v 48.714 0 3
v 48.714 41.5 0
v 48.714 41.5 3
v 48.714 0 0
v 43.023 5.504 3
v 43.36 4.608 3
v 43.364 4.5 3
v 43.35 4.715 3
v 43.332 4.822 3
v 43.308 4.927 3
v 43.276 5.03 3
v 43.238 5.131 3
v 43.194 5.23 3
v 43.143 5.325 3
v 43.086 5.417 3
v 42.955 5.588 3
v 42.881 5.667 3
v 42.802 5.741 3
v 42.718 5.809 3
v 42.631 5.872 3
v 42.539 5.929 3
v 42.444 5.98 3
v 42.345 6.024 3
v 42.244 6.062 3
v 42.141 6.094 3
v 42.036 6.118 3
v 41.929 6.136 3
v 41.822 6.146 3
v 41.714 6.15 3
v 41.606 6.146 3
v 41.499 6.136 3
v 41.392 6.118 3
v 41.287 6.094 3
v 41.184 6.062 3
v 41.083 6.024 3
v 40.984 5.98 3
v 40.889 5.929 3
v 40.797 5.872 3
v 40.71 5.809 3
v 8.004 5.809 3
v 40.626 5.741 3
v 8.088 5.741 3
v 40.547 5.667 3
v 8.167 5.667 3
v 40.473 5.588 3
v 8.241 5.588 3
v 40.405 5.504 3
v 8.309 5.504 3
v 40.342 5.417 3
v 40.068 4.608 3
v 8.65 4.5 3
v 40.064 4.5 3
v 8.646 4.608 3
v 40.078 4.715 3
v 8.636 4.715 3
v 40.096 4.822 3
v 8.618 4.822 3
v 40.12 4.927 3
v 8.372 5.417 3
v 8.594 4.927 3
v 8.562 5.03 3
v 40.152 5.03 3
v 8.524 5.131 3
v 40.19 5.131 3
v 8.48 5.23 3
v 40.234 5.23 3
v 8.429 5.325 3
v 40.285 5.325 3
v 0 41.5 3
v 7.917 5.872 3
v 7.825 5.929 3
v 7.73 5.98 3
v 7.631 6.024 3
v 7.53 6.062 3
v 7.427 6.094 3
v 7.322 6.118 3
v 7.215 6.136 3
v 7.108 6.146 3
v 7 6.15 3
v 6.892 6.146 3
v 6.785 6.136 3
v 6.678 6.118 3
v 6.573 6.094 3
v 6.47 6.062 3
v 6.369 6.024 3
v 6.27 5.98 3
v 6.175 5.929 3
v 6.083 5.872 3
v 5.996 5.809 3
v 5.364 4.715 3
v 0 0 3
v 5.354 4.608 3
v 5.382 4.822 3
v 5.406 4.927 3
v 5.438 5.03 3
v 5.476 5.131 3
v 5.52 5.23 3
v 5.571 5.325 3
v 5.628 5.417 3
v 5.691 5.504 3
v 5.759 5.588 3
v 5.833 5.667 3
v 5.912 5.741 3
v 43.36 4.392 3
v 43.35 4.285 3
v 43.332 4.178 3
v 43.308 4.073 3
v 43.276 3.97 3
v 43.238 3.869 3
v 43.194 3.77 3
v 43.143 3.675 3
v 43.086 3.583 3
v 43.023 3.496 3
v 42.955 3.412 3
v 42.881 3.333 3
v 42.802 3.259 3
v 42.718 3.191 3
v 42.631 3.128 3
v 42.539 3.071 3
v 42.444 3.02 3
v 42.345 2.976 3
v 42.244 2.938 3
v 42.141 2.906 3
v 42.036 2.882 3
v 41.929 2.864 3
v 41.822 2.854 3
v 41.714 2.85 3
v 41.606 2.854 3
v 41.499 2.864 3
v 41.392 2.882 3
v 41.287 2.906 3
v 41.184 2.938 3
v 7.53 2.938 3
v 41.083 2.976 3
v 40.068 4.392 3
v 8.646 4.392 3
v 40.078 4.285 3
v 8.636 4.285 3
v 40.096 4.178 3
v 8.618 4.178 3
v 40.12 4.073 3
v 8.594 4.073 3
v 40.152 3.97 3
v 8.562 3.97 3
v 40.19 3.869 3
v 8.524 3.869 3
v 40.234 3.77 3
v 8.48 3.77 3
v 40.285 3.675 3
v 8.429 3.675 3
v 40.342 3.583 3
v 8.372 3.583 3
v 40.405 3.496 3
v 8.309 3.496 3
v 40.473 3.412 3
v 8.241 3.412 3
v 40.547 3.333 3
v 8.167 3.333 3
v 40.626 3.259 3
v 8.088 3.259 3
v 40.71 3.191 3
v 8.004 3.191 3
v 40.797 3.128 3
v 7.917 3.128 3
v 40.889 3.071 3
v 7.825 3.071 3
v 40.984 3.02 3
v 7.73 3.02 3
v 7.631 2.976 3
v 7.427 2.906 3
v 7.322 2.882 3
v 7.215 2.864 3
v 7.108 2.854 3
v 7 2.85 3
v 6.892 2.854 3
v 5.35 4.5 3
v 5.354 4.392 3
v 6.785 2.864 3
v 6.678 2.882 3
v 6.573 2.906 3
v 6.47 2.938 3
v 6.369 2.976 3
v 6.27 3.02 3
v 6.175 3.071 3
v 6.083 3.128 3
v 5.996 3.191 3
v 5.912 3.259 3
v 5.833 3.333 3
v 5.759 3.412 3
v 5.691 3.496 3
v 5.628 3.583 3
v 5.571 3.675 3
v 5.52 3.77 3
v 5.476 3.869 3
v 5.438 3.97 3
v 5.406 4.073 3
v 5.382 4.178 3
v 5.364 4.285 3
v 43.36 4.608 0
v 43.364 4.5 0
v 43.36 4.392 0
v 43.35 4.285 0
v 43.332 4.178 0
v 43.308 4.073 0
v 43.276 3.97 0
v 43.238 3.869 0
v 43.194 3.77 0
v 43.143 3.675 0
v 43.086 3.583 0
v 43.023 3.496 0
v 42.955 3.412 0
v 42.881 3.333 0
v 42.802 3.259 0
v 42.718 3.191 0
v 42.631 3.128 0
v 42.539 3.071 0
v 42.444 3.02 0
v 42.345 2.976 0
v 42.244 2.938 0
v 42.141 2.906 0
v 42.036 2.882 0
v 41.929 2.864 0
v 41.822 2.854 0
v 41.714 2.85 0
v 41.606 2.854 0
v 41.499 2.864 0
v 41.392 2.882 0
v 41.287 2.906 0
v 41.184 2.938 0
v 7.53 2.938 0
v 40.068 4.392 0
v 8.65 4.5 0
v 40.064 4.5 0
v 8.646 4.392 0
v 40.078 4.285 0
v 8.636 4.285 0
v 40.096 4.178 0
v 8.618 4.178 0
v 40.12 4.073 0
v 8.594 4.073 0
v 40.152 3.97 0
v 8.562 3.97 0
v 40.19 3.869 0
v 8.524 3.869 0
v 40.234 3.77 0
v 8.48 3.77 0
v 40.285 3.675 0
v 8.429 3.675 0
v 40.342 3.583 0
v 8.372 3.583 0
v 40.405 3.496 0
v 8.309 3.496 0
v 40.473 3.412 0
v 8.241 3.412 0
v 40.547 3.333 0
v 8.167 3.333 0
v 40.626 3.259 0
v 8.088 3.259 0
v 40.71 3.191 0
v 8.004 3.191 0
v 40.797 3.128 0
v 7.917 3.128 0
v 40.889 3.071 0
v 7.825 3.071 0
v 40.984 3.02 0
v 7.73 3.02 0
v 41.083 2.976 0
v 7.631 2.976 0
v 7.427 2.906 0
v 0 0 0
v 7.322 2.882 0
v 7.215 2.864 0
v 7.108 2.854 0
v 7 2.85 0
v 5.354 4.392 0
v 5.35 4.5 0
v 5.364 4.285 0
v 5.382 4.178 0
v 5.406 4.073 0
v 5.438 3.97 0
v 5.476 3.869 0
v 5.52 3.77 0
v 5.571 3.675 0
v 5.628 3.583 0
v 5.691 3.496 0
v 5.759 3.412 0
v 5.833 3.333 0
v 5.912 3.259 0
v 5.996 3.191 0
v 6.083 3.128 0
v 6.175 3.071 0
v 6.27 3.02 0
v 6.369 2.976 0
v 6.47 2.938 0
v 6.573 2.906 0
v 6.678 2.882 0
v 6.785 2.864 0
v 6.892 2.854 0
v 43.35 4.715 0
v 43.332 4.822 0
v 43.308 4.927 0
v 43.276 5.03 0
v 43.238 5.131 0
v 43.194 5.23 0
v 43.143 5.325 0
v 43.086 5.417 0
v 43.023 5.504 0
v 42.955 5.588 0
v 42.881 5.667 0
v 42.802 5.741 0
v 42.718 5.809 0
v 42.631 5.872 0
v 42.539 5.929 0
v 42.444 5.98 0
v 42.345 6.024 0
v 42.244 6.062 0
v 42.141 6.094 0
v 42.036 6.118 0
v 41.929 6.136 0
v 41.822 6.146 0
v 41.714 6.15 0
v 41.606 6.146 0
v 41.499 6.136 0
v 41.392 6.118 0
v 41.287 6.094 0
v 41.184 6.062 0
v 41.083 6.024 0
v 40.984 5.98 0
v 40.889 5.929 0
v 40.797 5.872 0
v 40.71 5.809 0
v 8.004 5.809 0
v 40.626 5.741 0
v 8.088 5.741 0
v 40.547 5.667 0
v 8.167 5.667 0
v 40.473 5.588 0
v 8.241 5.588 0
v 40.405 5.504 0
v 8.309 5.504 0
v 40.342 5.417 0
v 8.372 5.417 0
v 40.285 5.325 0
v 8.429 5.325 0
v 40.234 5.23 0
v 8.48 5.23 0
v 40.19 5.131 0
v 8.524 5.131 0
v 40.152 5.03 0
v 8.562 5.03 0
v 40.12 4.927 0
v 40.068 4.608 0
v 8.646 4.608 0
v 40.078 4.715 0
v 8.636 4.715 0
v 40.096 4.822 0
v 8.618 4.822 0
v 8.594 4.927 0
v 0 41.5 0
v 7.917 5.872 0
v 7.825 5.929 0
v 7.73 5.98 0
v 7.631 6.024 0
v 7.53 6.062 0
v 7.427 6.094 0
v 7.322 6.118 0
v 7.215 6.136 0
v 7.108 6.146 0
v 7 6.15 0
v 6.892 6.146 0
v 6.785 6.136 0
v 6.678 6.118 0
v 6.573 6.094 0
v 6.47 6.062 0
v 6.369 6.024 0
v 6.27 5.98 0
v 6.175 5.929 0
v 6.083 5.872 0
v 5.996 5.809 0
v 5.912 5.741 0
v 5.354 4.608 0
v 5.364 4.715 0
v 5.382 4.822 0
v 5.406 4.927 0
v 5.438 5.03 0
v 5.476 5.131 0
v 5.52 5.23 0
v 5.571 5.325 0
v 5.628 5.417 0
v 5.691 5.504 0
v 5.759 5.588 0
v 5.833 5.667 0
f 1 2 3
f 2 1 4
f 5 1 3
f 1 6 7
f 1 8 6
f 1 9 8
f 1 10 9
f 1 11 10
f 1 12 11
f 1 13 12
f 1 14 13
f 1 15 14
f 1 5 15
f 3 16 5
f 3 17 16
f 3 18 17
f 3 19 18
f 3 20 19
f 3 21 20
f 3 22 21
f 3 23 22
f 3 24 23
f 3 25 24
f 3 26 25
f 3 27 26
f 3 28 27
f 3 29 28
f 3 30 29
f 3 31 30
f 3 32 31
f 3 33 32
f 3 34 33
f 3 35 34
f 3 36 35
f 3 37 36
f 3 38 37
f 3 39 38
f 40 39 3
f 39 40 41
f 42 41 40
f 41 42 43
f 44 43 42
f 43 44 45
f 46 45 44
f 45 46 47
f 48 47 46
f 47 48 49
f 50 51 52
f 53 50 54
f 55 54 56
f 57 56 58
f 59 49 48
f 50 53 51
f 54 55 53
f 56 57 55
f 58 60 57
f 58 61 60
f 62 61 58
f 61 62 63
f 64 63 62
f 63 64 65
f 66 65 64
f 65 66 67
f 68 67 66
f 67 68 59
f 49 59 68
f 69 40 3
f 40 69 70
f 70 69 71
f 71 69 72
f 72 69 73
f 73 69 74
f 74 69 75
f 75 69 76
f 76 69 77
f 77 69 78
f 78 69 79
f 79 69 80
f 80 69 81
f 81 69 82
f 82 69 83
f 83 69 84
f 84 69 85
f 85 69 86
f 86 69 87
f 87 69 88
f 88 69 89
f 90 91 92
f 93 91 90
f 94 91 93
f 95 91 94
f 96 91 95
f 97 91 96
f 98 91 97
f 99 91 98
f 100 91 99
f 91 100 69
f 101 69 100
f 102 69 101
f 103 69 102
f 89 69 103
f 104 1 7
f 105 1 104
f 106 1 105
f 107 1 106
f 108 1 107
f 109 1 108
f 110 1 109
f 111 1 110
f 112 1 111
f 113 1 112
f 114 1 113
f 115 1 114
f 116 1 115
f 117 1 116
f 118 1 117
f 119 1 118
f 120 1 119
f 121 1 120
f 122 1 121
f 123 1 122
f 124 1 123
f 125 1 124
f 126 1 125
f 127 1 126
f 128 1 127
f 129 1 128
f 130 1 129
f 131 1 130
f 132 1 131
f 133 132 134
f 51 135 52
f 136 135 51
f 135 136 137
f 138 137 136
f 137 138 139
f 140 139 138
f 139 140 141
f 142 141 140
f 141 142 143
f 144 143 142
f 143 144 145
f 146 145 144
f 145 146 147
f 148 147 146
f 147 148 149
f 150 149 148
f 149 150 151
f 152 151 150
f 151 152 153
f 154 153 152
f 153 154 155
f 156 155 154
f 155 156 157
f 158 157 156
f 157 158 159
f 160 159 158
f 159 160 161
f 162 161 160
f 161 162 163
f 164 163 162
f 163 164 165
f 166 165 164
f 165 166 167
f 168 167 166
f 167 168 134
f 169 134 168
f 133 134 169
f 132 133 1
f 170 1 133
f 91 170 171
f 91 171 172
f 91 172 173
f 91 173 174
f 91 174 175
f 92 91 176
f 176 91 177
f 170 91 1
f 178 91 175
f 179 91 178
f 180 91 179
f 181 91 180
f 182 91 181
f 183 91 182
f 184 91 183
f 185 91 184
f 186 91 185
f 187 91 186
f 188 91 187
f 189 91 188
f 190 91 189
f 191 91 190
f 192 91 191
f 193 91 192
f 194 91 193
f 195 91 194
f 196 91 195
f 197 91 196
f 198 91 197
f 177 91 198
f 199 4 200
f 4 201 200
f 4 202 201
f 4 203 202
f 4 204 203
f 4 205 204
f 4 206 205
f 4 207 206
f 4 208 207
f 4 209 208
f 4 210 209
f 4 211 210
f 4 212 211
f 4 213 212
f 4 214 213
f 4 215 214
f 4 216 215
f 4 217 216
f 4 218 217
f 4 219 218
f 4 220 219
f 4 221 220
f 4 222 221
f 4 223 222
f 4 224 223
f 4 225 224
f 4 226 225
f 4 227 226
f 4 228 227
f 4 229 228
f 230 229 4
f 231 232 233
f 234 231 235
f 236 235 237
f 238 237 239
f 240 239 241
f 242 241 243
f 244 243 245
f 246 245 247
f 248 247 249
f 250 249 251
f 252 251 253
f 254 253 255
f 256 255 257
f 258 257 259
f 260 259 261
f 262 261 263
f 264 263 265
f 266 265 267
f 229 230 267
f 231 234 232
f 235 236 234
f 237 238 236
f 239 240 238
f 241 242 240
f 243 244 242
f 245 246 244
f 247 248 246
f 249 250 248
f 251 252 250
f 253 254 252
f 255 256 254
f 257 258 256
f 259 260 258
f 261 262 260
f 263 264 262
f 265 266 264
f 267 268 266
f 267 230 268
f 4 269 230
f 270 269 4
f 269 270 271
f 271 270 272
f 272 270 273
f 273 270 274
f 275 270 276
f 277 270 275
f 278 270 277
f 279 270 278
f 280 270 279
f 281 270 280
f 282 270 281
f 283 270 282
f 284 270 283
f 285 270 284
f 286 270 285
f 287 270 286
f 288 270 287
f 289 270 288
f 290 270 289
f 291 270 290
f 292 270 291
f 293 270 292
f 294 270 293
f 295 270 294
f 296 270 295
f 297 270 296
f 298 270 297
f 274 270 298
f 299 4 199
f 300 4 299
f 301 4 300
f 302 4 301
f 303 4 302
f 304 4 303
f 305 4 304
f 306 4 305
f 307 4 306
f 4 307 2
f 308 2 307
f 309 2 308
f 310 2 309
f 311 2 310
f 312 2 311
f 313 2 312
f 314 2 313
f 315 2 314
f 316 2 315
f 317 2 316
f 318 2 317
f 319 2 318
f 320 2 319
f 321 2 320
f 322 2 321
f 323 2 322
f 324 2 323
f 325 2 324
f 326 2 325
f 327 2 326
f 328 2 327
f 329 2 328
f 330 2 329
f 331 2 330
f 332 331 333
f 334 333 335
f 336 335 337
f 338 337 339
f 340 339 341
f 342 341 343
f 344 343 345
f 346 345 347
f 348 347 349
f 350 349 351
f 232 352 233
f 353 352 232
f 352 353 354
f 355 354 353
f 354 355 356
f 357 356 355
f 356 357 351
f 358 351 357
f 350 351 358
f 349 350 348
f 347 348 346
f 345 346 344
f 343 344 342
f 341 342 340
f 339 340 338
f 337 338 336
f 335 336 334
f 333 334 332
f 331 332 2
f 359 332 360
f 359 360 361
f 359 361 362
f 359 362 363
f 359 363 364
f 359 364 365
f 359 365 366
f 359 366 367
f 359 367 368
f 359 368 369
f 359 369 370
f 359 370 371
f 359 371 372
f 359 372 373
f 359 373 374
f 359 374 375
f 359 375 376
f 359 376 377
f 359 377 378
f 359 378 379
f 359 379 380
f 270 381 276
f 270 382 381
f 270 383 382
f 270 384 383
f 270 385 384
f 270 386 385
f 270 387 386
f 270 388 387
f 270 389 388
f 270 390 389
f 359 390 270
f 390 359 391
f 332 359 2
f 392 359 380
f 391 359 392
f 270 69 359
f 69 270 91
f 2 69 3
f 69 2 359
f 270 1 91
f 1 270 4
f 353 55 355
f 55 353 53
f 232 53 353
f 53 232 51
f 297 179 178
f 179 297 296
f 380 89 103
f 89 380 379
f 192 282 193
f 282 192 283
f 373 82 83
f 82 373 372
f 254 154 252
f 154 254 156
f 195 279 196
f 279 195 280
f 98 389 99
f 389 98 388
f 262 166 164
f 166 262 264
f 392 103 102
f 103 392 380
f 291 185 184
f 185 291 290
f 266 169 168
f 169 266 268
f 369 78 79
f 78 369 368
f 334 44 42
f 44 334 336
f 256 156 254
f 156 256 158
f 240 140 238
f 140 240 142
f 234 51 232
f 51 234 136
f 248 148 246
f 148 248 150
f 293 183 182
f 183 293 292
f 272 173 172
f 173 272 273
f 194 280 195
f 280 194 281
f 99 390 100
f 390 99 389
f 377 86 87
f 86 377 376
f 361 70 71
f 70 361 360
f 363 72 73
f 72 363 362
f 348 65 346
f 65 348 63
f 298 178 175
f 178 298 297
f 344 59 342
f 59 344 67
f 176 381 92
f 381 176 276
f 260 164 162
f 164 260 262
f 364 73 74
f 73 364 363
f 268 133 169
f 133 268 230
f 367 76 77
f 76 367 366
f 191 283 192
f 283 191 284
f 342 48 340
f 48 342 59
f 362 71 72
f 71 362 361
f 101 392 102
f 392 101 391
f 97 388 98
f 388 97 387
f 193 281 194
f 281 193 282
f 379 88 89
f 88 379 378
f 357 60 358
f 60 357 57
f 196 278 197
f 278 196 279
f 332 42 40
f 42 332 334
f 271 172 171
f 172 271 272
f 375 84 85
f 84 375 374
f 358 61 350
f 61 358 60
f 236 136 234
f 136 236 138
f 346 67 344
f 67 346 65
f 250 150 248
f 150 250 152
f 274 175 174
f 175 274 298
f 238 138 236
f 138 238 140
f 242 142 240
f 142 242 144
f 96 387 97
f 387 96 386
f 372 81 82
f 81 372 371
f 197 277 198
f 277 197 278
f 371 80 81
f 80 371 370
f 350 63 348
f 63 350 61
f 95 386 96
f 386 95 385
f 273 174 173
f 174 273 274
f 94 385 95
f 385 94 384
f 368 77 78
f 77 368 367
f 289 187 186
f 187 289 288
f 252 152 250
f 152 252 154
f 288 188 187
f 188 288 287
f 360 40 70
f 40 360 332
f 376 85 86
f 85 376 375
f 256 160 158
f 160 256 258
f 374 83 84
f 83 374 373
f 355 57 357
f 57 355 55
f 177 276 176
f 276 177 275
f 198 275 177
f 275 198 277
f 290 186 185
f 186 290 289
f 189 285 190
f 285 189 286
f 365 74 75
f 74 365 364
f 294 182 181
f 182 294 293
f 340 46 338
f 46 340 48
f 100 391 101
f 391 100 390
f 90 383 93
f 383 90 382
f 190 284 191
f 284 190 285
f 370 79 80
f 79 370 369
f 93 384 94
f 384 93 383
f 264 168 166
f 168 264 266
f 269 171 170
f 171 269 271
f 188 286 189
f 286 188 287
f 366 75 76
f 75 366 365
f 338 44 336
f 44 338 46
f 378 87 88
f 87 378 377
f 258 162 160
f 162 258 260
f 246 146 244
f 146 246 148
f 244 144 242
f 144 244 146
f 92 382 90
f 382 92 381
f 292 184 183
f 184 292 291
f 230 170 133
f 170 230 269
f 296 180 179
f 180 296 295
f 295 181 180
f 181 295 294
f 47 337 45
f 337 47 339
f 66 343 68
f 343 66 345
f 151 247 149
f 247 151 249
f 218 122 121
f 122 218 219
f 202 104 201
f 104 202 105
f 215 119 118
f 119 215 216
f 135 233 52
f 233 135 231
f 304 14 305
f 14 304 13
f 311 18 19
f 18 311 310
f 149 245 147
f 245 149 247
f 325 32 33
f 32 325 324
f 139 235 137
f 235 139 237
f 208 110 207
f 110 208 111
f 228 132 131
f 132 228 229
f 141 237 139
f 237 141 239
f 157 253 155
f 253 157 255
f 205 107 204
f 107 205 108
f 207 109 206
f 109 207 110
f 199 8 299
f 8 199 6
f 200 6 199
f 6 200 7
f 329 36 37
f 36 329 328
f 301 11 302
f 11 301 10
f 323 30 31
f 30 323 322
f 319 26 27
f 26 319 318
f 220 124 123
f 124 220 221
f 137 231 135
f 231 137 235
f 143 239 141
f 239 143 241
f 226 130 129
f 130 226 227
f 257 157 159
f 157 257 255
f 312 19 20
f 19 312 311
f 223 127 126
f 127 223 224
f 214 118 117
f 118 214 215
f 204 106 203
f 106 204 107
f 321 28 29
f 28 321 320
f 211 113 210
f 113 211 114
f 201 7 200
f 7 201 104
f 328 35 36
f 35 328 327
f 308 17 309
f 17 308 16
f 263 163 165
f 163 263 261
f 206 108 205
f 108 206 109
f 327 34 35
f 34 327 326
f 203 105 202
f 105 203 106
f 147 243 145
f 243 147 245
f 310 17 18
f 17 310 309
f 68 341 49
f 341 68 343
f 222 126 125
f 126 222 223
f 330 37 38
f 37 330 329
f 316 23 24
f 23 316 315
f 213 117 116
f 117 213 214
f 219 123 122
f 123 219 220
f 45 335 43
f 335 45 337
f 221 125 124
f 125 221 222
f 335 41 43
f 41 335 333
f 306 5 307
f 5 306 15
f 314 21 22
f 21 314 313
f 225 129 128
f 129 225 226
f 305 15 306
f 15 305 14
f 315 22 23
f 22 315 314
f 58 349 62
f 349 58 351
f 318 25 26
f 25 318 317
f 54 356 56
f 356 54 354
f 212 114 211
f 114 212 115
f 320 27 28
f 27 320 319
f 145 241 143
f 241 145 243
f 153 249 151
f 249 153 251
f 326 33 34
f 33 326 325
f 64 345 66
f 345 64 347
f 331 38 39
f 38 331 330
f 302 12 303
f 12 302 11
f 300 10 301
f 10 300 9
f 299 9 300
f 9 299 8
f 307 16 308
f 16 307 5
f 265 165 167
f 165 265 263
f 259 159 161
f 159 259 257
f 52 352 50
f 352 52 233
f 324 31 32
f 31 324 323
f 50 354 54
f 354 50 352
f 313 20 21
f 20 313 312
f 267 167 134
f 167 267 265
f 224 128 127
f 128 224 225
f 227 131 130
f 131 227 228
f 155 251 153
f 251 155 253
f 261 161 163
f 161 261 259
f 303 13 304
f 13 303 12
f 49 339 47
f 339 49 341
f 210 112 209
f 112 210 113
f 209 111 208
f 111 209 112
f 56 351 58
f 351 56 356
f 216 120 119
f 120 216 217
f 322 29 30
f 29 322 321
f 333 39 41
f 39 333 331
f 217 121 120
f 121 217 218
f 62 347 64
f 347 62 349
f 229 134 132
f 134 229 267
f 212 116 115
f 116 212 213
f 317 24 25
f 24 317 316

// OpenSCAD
// Pocket lid (lid) for 137 MHz V-dipole for weather satellites
// PETG, 0.2 mm layers, 4 walls, 40% infill, no supports
// Print it: flat on the bed
// Generated by the blueprint skill from the plan at its current size. Units: mm.
$fn = 96;
translate([24.357, 27.145, -1031.38])
difference() {
  union() {
    translate([-24.357, -27.145, 1031.38]) cube([48.714, 41.5, 3]);
  }
  translate([-17.357, -22.645, 1030.38]) rotate([0, 0.000, 0.000]) translate([0, 0, -0.01]) cylinder(h = 5.020, r = 1.650);
  translate([17.357, -22.645, 1030.38]) rotate([0, 0.000, 0.000]) translate([0, 0, -0.01]) cylinder(h = 5.020, r = 1.650);
}
